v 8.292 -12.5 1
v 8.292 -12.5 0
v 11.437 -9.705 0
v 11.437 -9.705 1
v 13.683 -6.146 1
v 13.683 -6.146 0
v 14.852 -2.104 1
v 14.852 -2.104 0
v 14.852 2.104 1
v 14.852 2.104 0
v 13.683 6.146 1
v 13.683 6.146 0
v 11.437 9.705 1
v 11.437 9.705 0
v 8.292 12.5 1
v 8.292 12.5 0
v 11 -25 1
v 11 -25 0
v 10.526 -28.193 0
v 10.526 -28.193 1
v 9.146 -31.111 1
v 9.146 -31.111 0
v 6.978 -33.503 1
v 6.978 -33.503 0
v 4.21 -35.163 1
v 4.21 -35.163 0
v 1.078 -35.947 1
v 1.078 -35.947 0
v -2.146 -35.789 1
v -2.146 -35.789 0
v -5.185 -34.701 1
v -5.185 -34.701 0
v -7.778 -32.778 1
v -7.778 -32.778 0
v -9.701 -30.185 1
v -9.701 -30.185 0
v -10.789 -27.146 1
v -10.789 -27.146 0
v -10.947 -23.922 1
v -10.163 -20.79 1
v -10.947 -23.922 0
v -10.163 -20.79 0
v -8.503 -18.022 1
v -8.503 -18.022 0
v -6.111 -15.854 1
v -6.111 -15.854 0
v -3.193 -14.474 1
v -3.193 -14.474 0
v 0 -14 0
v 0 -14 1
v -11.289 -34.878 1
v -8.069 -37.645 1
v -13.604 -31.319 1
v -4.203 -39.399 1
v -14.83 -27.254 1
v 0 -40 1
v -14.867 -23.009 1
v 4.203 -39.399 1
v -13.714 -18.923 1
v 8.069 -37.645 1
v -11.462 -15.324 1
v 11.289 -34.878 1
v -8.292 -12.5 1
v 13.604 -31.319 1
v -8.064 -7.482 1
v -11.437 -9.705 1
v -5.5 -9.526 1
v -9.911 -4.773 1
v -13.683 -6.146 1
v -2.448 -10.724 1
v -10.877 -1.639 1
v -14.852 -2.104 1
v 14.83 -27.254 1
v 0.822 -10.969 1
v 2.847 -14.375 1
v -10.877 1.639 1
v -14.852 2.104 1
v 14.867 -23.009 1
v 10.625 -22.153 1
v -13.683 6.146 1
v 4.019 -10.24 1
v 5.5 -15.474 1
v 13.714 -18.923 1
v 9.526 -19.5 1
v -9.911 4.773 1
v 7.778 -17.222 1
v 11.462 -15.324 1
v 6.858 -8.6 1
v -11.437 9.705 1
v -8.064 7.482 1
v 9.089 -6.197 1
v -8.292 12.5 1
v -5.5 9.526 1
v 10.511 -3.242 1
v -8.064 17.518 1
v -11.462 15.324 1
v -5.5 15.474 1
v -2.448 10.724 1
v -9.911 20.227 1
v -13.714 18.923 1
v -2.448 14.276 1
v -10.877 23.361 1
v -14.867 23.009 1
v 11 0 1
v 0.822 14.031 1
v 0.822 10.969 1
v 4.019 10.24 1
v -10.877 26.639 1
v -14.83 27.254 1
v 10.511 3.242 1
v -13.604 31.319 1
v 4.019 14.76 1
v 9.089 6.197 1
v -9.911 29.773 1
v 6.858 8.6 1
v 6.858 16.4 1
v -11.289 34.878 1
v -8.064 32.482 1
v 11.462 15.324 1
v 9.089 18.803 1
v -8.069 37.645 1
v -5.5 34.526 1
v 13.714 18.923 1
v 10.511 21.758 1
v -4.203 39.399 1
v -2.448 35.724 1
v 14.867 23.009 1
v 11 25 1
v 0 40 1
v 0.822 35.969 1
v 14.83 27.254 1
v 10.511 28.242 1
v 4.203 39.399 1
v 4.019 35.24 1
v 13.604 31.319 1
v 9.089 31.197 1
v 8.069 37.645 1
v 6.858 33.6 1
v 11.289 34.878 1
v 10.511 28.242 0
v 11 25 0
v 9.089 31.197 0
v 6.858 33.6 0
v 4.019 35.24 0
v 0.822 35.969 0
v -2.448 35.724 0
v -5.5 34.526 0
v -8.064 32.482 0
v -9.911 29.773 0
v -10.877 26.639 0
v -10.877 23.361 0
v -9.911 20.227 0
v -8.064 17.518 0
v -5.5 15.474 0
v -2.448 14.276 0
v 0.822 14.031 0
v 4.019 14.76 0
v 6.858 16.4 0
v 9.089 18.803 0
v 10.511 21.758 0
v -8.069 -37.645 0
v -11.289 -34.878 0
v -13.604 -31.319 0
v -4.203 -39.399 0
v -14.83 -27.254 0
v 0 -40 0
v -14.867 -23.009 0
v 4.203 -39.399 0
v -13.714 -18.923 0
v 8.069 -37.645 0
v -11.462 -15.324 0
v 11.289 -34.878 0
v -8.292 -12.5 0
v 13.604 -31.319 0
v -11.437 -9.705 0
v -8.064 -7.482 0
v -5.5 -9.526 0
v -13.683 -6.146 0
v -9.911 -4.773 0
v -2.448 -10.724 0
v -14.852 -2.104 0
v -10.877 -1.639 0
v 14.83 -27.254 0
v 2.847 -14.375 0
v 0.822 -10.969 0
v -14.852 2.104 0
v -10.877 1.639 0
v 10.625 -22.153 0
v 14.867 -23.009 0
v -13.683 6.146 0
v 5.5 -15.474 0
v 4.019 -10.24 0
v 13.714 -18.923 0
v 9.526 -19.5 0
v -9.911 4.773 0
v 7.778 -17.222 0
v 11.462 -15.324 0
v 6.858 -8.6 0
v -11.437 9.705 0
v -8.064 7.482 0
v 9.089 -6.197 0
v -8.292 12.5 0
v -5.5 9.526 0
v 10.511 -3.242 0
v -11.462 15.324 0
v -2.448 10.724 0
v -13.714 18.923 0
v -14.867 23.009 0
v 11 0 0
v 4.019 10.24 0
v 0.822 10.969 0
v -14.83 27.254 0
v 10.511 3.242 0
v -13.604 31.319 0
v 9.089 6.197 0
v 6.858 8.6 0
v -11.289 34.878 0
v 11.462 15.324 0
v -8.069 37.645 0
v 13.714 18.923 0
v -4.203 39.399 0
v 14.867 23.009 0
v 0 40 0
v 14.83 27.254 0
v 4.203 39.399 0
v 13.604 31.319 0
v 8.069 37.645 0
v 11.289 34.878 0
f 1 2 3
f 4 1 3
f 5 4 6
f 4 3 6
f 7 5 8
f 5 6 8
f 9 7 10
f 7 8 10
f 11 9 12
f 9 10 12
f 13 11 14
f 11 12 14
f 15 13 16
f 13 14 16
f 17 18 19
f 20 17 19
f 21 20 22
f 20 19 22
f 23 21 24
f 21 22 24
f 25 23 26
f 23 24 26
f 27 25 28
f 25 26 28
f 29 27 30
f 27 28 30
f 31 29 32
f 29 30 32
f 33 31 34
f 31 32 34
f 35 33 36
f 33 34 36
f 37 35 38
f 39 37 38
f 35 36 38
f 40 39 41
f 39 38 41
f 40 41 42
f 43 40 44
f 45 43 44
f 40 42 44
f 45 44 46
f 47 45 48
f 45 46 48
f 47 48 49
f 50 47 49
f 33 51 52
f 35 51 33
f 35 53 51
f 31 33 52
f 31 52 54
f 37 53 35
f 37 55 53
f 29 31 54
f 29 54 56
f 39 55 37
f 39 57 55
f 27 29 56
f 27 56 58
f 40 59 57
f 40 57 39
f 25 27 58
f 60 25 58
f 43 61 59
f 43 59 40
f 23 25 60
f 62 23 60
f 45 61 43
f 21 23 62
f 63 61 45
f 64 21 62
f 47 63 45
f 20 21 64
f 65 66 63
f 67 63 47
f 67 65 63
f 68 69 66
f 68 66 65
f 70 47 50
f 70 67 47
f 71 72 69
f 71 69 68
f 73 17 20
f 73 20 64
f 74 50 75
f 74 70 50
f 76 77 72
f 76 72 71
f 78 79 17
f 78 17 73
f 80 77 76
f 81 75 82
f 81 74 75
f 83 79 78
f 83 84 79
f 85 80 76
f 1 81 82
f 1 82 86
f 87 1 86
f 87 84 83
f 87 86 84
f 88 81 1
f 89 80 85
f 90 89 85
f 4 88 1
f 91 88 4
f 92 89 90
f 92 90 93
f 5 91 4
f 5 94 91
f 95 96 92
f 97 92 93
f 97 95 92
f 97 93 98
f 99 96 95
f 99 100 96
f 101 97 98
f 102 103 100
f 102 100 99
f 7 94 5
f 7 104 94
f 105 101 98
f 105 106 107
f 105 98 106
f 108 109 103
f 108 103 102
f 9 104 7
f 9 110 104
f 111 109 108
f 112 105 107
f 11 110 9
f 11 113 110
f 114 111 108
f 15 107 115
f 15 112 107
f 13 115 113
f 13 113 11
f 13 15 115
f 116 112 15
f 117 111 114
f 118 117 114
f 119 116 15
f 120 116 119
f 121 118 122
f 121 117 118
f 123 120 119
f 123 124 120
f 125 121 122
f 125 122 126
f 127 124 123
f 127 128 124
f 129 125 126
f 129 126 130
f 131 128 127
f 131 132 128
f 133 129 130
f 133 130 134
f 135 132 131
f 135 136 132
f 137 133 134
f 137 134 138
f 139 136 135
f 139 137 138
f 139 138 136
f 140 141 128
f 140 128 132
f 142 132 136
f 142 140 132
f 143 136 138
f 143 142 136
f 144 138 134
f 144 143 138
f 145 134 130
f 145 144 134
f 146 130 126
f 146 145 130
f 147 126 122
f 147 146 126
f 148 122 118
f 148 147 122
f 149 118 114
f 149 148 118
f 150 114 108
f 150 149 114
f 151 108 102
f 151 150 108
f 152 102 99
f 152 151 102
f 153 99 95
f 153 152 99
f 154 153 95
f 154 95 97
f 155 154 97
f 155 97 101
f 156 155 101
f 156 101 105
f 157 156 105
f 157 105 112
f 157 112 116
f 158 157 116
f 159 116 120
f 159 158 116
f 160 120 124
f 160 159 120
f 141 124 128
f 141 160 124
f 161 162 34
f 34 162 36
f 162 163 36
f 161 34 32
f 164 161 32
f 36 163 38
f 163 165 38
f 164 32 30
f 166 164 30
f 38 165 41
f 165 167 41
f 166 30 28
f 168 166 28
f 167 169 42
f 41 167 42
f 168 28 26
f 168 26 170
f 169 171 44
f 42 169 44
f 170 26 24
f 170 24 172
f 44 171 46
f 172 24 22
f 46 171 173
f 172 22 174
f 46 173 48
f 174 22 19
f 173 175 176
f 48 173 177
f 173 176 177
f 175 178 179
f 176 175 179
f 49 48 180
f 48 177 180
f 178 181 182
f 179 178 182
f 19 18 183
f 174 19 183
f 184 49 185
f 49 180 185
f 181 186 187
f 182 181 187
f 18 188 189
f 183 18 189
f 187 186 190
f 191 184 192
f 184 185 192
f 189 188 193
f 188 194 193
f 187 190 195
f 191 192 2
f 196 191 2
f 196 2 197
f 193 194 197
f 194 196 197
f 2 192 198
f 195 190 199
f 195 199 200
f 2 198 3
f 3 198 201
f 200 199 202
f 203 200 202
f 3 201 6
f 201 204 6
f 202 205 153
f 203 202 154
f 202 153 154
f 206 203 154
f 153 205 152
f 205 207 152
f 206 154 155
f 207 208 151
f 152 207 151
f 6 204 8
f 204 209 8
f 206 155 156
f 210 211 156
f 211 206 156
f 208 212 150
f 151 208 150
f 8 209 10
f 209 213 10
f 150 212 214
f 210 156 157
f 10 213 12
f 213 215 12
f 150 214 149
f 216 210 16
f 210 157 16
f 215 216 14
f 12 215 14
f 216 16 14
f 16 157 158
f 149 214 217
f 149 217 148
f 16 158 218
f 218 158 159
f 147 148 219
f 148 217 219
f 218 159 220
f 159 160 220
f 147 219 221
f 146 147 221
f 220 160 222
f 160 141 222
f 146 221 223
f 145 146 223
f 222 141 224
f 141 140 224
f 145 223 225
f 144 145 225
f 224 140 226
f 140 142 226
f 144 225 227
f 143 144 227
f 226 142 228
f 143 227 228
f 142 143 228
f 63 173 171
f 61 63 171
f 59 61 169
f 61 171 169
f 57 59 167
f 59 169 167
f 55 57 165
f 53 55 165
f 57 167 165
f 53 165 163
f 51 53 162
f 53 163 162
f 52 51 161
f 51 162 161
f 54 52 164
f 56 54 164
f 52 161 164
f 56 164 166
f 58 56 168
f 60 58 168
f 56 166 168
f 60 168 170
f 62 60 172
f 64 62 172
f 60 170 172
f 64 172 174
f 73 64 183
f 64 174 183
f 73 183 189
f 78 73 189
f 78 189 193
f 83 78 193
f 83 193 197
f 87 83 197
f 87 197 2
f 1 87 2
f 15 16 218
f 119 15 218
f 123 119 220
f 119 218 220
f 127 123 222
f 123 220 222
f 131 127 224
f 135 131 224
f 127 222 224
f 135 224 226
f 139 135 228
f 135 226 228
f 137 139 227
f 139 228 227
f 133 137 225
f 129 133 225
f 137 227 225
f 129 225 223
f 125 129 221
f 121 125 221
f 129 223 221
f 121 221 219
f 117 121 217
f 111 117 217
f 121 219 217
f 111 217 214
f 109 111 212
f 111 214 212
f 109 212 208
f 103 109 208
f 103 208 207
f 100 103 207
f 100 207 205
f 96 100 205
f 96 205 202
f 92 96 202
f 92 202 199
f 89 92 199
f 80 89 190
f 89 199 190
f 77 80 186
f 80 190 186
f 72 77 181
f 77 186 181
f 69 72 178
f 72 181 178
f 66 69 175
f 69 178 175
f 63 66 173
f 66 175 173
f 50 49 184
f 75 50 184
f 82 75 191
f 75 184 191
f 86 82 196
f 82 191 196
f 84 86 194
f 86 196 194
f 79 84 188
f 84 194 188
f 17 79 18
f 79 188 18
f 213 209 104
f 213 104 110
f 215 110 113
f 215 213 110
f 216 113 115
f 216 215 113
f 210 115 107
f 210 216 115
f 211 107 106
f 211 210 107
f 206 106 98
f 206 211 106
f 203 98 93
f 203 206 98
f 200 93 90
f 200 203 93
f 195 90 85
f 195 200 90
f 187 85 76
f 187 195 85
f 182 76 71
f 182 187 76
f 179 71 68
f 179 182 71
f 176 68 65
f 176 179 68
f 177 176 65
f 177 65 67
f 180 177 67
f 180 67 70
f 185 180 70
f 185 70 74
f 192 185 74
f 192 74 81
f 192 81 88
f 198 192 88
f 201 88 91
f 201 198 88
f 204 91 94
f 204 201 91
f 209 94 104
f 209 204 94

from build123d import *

# Parameters (mm, degrees)
F0_R     = 11
F1_DEPTH = 1


with BuildPart() as f1:
    # F0 (on Top) → F1 (new body)
    with BuildSketch(Plane.XY):
        with BuildLine():
            ThreePointArc((8.291562, -12.5), (15, 0), (8.291562, 12.5))
            ThreePointArc((8.291562, 12.5), (0, 40), (-8.291562, 12.5))
            ThreePointArc((-8.291562, 12.5), (-15, 0), (-8.291562, -12.5))
            ThreePointArc((-8.291562, -12.5), (0, -40), (8.291562, -12.5))
        make_face()
        with BuildLine():
            ThreePointArc((0, -14), (7.778175, -17.221825), (11, -25))
            ThreePointArc((11, -25), (-7.778175, -32.778175), (0, -14))
        make_face(mode=Mode.SUBTRACT)
        Circle(F0_R, mode=Mode.SUBTRACT)
        with Locations((0, 25)):
            Circle(F0_R, mode=Mode.SUBTRACT)
    extrude(amount=F1_DEPTH)


solid = f1.part
